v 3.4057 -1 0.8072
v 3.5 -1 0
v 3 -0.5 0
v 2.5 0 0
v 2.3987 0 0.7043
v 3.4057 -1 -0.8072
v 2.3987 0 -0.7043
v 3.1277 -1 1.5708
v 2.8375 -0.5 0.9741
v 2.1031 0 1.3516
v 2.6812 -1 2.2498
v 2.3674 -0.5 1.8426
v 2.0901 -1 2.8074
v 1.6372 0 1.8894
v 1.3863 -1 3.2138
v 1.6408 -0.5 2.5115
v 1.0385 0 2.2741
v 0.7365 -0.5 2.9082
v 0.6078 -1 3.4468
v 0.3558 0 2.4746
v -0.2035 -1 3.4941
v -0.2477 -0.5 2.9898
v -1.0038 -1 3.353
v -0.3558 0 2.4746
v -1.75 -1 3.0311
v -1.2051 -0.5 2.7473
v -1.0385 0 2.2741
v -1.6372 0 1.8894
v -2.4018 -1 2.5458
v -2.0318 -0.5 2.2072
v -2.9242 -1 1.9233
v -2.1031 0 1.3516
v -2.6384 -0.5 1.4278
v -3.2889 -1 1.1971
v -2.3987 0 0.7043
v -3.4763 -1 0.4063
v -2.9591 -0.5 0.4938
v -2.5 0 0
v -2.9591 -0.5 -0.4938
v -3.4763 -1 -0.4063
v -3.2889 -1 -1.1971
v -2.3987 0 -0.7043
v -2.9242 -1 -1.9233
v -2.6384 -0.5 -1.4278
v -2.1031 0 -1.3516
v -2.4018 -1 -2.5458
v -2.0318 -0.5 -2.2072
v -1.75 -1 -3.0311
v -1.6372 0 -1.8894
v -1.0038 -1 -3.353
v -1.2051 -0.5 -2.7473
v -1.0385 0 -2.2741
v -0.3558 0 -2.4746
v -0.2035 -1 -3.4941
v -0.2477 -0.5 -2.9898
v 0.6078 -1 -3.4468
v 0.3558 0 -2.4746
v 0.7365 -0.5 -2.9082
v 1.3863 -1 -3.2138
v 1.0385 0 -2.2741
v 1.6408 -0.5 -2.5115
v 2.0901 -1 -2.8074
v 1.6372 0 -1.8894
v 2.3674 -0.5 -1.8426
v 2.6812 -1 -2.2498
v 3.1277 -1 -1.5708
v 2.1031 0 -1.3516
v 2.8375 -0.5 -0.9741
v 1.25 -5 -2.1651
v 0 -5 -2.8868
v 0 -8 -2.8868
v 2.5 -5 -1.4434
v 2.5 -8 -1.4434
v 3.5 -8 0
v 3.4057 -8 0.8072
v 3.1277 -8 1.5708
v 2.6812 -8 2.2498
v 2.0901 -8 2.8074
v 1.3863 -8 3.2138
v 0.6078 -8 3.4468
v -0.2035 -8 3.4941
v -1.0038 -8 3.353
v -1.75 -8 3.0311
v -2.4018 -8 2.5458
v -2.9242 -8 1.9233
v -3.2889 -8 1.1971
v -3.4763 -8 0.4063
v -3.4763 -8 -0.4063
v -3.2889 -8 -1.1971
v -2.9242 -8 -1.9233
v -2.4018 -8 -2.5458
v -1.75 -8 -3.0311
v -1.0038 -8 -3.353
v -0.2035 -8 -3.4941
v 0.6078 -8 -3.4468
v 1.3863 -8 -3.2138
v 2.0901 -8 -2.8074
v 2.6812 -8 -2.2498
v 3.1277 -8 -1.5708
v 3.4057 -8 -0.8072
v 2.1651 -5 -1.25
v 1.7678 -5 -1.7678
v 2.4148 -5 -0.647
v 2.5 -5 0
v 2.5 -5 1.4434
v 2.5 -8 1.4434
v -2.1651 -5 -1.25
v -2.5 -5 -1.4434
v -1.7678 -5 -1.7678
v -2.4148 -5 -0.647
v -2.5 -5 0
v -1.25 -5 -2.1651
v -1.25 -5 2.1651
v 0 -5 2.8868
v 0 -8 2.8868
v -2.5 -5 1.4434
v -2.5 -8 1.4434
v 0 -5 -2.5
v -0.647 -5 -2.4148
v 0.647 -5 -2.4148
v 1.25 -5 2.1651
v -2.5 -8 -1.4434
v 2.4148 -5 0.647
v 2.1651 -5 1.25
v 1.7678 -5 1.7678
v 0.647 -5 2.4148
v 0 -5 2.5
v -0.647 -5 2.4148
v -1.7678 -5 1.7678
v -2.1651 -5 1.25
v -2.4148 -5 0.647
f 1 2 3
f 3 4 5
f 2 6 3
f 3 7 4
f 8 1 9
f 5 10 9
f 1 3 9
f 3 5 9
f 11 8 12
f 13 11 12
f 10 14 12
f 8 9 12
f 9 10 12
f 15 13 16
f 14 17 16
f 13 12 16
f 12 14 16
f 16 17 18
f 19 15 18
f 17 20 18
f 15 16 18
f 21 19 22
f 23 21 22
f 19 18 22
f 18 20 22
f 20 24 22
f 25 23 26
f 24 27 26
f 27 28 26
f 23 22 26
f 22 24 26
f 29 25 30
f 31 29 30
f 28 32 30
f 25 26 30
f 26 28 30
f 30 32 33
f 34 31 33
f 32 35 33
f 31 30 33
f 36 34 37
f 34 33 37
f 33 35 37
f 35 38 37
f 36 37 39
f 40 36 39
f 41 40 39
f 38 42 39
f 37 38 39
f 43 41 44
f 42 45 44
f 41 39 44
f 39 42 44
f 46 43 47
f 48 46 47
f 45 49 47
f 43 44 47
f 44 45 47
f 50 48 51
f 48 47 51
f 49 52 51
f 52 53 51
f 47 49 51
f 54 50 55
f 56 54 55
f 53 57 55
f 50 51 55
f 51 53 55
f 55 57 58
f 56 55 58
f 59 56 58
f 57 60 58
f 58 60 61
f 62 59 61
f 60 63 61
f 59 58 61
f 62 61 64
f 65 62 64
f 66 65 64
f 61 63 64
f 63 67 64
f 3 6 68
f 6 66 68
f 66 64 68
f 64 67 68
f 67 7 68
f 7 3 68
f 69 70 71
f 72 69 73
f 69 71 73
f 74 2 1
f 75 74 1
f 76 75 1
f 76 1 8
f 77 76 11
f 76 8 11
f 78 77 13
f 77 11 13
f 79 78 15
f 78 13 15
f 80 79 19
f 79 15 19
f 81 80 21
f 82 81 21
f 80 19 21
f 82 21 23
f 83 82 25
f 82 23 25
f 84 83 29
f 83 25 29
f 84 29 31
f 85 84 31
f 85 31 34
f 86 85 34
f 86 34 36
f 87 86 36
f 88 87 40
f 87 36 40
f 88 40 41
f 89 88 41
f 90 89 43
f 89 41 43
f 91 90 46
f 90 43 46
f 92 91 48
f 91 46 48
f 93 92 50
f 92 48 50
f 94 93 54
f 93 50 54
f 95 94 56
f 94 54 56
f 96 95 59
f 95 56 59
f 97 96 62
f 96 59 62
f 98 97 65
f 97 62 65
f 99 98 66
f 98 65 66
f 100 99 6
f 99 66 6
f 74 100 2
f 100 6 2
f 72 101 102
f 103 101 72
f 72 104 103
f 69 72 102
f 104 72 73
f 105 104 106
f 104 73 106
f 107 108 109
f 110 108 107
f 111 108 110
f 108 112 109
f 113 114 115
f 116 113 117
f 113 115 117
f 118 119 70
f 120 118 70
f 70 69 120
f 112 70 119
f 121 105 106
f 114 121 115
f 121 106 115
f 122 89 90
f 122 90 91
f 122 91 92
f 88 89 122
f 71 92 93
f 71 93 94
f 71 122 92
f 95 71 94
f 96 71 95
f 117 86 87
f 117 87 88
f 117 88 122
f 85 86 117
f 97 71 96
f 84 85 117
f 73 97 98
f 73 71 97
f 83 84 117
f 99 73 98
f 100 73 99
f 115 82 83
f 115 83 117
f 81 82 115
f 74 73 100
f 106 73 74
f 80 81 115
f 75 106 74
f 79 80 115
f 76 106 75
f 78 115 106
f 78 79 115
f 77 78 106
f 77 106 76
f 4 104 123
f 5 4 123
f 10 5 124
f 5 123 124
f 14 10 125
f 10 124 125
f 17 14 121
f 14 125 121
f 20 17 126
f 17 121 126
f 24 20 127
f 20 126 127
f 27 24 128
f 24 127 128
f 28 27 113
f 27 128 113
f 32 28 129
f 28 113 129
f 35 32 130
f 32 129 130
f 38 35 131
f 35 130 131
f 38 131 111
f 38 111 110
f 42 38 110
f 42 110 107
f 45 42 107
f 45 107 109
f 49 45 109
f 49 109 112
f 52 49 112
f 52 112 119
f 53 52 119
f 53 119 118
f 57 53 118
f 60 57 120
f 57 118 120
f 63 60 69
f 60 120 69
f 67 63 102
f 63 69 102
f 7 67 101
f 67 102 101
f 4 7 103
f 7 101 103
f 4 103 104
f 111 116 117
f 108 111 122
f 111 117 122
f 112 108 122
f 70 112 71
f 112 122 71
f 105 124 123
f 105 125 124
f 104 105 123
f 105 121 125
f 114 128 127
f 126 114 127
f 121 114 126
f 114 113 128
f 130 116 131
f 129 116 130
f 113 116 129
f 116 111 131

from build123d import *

# Parameters (mm, degrees)
F0_R     = 3.5
F1_DEPTH = 8
F3_DEPTH = 3
F4_R     = 2.5
F5_DEPTH = 25
F6_SIZE  = 0.99999


# Not quite as in the source:
# - a fillet or chamfer is up to 0.001 mm smaller than in the source, because OpenCascade refuses the exact size


with BuildPart() as f1:
    # F0 (on Front) → F1 (new body)
    with BuildSketch(Plane.XZ):
        Circle(F0_R)
    extrude(amount=F1_DEPTH)

    # F2 (on face) → F3 (cut)
    with BuildSketch(Plane.XZ.offset(8)):
        Polygon((2.5, 1.443375673), (0, 2.8867513459), (-2.5, 1.443375673), (-2.5, -1.443375673), (0, -2.8867513459), (2.5, -1.443375673), align=None)
    extrude(amount=-F3_DEPTH, mode=Mode.SUBTRACT)

    # F4 (on face) → F5 (cut)
    with BuildSketch(Plane.XZ.offset(5)):
        Circle(F4_R)
    extrude(amount=-F5_DEPTH, mode=Mode.SUBTRACT)

    # F6 (size 1 in the source; OpenCascade refuses exactly that, so slightly less here)
    f6_edges = [f1.edges().sort_by_distance(p)[0] for p in [
        (-3.5, 0, 0),
    ]]
    chamfer(f6_edges, length=F6_SIZE)


solid = f1.part
